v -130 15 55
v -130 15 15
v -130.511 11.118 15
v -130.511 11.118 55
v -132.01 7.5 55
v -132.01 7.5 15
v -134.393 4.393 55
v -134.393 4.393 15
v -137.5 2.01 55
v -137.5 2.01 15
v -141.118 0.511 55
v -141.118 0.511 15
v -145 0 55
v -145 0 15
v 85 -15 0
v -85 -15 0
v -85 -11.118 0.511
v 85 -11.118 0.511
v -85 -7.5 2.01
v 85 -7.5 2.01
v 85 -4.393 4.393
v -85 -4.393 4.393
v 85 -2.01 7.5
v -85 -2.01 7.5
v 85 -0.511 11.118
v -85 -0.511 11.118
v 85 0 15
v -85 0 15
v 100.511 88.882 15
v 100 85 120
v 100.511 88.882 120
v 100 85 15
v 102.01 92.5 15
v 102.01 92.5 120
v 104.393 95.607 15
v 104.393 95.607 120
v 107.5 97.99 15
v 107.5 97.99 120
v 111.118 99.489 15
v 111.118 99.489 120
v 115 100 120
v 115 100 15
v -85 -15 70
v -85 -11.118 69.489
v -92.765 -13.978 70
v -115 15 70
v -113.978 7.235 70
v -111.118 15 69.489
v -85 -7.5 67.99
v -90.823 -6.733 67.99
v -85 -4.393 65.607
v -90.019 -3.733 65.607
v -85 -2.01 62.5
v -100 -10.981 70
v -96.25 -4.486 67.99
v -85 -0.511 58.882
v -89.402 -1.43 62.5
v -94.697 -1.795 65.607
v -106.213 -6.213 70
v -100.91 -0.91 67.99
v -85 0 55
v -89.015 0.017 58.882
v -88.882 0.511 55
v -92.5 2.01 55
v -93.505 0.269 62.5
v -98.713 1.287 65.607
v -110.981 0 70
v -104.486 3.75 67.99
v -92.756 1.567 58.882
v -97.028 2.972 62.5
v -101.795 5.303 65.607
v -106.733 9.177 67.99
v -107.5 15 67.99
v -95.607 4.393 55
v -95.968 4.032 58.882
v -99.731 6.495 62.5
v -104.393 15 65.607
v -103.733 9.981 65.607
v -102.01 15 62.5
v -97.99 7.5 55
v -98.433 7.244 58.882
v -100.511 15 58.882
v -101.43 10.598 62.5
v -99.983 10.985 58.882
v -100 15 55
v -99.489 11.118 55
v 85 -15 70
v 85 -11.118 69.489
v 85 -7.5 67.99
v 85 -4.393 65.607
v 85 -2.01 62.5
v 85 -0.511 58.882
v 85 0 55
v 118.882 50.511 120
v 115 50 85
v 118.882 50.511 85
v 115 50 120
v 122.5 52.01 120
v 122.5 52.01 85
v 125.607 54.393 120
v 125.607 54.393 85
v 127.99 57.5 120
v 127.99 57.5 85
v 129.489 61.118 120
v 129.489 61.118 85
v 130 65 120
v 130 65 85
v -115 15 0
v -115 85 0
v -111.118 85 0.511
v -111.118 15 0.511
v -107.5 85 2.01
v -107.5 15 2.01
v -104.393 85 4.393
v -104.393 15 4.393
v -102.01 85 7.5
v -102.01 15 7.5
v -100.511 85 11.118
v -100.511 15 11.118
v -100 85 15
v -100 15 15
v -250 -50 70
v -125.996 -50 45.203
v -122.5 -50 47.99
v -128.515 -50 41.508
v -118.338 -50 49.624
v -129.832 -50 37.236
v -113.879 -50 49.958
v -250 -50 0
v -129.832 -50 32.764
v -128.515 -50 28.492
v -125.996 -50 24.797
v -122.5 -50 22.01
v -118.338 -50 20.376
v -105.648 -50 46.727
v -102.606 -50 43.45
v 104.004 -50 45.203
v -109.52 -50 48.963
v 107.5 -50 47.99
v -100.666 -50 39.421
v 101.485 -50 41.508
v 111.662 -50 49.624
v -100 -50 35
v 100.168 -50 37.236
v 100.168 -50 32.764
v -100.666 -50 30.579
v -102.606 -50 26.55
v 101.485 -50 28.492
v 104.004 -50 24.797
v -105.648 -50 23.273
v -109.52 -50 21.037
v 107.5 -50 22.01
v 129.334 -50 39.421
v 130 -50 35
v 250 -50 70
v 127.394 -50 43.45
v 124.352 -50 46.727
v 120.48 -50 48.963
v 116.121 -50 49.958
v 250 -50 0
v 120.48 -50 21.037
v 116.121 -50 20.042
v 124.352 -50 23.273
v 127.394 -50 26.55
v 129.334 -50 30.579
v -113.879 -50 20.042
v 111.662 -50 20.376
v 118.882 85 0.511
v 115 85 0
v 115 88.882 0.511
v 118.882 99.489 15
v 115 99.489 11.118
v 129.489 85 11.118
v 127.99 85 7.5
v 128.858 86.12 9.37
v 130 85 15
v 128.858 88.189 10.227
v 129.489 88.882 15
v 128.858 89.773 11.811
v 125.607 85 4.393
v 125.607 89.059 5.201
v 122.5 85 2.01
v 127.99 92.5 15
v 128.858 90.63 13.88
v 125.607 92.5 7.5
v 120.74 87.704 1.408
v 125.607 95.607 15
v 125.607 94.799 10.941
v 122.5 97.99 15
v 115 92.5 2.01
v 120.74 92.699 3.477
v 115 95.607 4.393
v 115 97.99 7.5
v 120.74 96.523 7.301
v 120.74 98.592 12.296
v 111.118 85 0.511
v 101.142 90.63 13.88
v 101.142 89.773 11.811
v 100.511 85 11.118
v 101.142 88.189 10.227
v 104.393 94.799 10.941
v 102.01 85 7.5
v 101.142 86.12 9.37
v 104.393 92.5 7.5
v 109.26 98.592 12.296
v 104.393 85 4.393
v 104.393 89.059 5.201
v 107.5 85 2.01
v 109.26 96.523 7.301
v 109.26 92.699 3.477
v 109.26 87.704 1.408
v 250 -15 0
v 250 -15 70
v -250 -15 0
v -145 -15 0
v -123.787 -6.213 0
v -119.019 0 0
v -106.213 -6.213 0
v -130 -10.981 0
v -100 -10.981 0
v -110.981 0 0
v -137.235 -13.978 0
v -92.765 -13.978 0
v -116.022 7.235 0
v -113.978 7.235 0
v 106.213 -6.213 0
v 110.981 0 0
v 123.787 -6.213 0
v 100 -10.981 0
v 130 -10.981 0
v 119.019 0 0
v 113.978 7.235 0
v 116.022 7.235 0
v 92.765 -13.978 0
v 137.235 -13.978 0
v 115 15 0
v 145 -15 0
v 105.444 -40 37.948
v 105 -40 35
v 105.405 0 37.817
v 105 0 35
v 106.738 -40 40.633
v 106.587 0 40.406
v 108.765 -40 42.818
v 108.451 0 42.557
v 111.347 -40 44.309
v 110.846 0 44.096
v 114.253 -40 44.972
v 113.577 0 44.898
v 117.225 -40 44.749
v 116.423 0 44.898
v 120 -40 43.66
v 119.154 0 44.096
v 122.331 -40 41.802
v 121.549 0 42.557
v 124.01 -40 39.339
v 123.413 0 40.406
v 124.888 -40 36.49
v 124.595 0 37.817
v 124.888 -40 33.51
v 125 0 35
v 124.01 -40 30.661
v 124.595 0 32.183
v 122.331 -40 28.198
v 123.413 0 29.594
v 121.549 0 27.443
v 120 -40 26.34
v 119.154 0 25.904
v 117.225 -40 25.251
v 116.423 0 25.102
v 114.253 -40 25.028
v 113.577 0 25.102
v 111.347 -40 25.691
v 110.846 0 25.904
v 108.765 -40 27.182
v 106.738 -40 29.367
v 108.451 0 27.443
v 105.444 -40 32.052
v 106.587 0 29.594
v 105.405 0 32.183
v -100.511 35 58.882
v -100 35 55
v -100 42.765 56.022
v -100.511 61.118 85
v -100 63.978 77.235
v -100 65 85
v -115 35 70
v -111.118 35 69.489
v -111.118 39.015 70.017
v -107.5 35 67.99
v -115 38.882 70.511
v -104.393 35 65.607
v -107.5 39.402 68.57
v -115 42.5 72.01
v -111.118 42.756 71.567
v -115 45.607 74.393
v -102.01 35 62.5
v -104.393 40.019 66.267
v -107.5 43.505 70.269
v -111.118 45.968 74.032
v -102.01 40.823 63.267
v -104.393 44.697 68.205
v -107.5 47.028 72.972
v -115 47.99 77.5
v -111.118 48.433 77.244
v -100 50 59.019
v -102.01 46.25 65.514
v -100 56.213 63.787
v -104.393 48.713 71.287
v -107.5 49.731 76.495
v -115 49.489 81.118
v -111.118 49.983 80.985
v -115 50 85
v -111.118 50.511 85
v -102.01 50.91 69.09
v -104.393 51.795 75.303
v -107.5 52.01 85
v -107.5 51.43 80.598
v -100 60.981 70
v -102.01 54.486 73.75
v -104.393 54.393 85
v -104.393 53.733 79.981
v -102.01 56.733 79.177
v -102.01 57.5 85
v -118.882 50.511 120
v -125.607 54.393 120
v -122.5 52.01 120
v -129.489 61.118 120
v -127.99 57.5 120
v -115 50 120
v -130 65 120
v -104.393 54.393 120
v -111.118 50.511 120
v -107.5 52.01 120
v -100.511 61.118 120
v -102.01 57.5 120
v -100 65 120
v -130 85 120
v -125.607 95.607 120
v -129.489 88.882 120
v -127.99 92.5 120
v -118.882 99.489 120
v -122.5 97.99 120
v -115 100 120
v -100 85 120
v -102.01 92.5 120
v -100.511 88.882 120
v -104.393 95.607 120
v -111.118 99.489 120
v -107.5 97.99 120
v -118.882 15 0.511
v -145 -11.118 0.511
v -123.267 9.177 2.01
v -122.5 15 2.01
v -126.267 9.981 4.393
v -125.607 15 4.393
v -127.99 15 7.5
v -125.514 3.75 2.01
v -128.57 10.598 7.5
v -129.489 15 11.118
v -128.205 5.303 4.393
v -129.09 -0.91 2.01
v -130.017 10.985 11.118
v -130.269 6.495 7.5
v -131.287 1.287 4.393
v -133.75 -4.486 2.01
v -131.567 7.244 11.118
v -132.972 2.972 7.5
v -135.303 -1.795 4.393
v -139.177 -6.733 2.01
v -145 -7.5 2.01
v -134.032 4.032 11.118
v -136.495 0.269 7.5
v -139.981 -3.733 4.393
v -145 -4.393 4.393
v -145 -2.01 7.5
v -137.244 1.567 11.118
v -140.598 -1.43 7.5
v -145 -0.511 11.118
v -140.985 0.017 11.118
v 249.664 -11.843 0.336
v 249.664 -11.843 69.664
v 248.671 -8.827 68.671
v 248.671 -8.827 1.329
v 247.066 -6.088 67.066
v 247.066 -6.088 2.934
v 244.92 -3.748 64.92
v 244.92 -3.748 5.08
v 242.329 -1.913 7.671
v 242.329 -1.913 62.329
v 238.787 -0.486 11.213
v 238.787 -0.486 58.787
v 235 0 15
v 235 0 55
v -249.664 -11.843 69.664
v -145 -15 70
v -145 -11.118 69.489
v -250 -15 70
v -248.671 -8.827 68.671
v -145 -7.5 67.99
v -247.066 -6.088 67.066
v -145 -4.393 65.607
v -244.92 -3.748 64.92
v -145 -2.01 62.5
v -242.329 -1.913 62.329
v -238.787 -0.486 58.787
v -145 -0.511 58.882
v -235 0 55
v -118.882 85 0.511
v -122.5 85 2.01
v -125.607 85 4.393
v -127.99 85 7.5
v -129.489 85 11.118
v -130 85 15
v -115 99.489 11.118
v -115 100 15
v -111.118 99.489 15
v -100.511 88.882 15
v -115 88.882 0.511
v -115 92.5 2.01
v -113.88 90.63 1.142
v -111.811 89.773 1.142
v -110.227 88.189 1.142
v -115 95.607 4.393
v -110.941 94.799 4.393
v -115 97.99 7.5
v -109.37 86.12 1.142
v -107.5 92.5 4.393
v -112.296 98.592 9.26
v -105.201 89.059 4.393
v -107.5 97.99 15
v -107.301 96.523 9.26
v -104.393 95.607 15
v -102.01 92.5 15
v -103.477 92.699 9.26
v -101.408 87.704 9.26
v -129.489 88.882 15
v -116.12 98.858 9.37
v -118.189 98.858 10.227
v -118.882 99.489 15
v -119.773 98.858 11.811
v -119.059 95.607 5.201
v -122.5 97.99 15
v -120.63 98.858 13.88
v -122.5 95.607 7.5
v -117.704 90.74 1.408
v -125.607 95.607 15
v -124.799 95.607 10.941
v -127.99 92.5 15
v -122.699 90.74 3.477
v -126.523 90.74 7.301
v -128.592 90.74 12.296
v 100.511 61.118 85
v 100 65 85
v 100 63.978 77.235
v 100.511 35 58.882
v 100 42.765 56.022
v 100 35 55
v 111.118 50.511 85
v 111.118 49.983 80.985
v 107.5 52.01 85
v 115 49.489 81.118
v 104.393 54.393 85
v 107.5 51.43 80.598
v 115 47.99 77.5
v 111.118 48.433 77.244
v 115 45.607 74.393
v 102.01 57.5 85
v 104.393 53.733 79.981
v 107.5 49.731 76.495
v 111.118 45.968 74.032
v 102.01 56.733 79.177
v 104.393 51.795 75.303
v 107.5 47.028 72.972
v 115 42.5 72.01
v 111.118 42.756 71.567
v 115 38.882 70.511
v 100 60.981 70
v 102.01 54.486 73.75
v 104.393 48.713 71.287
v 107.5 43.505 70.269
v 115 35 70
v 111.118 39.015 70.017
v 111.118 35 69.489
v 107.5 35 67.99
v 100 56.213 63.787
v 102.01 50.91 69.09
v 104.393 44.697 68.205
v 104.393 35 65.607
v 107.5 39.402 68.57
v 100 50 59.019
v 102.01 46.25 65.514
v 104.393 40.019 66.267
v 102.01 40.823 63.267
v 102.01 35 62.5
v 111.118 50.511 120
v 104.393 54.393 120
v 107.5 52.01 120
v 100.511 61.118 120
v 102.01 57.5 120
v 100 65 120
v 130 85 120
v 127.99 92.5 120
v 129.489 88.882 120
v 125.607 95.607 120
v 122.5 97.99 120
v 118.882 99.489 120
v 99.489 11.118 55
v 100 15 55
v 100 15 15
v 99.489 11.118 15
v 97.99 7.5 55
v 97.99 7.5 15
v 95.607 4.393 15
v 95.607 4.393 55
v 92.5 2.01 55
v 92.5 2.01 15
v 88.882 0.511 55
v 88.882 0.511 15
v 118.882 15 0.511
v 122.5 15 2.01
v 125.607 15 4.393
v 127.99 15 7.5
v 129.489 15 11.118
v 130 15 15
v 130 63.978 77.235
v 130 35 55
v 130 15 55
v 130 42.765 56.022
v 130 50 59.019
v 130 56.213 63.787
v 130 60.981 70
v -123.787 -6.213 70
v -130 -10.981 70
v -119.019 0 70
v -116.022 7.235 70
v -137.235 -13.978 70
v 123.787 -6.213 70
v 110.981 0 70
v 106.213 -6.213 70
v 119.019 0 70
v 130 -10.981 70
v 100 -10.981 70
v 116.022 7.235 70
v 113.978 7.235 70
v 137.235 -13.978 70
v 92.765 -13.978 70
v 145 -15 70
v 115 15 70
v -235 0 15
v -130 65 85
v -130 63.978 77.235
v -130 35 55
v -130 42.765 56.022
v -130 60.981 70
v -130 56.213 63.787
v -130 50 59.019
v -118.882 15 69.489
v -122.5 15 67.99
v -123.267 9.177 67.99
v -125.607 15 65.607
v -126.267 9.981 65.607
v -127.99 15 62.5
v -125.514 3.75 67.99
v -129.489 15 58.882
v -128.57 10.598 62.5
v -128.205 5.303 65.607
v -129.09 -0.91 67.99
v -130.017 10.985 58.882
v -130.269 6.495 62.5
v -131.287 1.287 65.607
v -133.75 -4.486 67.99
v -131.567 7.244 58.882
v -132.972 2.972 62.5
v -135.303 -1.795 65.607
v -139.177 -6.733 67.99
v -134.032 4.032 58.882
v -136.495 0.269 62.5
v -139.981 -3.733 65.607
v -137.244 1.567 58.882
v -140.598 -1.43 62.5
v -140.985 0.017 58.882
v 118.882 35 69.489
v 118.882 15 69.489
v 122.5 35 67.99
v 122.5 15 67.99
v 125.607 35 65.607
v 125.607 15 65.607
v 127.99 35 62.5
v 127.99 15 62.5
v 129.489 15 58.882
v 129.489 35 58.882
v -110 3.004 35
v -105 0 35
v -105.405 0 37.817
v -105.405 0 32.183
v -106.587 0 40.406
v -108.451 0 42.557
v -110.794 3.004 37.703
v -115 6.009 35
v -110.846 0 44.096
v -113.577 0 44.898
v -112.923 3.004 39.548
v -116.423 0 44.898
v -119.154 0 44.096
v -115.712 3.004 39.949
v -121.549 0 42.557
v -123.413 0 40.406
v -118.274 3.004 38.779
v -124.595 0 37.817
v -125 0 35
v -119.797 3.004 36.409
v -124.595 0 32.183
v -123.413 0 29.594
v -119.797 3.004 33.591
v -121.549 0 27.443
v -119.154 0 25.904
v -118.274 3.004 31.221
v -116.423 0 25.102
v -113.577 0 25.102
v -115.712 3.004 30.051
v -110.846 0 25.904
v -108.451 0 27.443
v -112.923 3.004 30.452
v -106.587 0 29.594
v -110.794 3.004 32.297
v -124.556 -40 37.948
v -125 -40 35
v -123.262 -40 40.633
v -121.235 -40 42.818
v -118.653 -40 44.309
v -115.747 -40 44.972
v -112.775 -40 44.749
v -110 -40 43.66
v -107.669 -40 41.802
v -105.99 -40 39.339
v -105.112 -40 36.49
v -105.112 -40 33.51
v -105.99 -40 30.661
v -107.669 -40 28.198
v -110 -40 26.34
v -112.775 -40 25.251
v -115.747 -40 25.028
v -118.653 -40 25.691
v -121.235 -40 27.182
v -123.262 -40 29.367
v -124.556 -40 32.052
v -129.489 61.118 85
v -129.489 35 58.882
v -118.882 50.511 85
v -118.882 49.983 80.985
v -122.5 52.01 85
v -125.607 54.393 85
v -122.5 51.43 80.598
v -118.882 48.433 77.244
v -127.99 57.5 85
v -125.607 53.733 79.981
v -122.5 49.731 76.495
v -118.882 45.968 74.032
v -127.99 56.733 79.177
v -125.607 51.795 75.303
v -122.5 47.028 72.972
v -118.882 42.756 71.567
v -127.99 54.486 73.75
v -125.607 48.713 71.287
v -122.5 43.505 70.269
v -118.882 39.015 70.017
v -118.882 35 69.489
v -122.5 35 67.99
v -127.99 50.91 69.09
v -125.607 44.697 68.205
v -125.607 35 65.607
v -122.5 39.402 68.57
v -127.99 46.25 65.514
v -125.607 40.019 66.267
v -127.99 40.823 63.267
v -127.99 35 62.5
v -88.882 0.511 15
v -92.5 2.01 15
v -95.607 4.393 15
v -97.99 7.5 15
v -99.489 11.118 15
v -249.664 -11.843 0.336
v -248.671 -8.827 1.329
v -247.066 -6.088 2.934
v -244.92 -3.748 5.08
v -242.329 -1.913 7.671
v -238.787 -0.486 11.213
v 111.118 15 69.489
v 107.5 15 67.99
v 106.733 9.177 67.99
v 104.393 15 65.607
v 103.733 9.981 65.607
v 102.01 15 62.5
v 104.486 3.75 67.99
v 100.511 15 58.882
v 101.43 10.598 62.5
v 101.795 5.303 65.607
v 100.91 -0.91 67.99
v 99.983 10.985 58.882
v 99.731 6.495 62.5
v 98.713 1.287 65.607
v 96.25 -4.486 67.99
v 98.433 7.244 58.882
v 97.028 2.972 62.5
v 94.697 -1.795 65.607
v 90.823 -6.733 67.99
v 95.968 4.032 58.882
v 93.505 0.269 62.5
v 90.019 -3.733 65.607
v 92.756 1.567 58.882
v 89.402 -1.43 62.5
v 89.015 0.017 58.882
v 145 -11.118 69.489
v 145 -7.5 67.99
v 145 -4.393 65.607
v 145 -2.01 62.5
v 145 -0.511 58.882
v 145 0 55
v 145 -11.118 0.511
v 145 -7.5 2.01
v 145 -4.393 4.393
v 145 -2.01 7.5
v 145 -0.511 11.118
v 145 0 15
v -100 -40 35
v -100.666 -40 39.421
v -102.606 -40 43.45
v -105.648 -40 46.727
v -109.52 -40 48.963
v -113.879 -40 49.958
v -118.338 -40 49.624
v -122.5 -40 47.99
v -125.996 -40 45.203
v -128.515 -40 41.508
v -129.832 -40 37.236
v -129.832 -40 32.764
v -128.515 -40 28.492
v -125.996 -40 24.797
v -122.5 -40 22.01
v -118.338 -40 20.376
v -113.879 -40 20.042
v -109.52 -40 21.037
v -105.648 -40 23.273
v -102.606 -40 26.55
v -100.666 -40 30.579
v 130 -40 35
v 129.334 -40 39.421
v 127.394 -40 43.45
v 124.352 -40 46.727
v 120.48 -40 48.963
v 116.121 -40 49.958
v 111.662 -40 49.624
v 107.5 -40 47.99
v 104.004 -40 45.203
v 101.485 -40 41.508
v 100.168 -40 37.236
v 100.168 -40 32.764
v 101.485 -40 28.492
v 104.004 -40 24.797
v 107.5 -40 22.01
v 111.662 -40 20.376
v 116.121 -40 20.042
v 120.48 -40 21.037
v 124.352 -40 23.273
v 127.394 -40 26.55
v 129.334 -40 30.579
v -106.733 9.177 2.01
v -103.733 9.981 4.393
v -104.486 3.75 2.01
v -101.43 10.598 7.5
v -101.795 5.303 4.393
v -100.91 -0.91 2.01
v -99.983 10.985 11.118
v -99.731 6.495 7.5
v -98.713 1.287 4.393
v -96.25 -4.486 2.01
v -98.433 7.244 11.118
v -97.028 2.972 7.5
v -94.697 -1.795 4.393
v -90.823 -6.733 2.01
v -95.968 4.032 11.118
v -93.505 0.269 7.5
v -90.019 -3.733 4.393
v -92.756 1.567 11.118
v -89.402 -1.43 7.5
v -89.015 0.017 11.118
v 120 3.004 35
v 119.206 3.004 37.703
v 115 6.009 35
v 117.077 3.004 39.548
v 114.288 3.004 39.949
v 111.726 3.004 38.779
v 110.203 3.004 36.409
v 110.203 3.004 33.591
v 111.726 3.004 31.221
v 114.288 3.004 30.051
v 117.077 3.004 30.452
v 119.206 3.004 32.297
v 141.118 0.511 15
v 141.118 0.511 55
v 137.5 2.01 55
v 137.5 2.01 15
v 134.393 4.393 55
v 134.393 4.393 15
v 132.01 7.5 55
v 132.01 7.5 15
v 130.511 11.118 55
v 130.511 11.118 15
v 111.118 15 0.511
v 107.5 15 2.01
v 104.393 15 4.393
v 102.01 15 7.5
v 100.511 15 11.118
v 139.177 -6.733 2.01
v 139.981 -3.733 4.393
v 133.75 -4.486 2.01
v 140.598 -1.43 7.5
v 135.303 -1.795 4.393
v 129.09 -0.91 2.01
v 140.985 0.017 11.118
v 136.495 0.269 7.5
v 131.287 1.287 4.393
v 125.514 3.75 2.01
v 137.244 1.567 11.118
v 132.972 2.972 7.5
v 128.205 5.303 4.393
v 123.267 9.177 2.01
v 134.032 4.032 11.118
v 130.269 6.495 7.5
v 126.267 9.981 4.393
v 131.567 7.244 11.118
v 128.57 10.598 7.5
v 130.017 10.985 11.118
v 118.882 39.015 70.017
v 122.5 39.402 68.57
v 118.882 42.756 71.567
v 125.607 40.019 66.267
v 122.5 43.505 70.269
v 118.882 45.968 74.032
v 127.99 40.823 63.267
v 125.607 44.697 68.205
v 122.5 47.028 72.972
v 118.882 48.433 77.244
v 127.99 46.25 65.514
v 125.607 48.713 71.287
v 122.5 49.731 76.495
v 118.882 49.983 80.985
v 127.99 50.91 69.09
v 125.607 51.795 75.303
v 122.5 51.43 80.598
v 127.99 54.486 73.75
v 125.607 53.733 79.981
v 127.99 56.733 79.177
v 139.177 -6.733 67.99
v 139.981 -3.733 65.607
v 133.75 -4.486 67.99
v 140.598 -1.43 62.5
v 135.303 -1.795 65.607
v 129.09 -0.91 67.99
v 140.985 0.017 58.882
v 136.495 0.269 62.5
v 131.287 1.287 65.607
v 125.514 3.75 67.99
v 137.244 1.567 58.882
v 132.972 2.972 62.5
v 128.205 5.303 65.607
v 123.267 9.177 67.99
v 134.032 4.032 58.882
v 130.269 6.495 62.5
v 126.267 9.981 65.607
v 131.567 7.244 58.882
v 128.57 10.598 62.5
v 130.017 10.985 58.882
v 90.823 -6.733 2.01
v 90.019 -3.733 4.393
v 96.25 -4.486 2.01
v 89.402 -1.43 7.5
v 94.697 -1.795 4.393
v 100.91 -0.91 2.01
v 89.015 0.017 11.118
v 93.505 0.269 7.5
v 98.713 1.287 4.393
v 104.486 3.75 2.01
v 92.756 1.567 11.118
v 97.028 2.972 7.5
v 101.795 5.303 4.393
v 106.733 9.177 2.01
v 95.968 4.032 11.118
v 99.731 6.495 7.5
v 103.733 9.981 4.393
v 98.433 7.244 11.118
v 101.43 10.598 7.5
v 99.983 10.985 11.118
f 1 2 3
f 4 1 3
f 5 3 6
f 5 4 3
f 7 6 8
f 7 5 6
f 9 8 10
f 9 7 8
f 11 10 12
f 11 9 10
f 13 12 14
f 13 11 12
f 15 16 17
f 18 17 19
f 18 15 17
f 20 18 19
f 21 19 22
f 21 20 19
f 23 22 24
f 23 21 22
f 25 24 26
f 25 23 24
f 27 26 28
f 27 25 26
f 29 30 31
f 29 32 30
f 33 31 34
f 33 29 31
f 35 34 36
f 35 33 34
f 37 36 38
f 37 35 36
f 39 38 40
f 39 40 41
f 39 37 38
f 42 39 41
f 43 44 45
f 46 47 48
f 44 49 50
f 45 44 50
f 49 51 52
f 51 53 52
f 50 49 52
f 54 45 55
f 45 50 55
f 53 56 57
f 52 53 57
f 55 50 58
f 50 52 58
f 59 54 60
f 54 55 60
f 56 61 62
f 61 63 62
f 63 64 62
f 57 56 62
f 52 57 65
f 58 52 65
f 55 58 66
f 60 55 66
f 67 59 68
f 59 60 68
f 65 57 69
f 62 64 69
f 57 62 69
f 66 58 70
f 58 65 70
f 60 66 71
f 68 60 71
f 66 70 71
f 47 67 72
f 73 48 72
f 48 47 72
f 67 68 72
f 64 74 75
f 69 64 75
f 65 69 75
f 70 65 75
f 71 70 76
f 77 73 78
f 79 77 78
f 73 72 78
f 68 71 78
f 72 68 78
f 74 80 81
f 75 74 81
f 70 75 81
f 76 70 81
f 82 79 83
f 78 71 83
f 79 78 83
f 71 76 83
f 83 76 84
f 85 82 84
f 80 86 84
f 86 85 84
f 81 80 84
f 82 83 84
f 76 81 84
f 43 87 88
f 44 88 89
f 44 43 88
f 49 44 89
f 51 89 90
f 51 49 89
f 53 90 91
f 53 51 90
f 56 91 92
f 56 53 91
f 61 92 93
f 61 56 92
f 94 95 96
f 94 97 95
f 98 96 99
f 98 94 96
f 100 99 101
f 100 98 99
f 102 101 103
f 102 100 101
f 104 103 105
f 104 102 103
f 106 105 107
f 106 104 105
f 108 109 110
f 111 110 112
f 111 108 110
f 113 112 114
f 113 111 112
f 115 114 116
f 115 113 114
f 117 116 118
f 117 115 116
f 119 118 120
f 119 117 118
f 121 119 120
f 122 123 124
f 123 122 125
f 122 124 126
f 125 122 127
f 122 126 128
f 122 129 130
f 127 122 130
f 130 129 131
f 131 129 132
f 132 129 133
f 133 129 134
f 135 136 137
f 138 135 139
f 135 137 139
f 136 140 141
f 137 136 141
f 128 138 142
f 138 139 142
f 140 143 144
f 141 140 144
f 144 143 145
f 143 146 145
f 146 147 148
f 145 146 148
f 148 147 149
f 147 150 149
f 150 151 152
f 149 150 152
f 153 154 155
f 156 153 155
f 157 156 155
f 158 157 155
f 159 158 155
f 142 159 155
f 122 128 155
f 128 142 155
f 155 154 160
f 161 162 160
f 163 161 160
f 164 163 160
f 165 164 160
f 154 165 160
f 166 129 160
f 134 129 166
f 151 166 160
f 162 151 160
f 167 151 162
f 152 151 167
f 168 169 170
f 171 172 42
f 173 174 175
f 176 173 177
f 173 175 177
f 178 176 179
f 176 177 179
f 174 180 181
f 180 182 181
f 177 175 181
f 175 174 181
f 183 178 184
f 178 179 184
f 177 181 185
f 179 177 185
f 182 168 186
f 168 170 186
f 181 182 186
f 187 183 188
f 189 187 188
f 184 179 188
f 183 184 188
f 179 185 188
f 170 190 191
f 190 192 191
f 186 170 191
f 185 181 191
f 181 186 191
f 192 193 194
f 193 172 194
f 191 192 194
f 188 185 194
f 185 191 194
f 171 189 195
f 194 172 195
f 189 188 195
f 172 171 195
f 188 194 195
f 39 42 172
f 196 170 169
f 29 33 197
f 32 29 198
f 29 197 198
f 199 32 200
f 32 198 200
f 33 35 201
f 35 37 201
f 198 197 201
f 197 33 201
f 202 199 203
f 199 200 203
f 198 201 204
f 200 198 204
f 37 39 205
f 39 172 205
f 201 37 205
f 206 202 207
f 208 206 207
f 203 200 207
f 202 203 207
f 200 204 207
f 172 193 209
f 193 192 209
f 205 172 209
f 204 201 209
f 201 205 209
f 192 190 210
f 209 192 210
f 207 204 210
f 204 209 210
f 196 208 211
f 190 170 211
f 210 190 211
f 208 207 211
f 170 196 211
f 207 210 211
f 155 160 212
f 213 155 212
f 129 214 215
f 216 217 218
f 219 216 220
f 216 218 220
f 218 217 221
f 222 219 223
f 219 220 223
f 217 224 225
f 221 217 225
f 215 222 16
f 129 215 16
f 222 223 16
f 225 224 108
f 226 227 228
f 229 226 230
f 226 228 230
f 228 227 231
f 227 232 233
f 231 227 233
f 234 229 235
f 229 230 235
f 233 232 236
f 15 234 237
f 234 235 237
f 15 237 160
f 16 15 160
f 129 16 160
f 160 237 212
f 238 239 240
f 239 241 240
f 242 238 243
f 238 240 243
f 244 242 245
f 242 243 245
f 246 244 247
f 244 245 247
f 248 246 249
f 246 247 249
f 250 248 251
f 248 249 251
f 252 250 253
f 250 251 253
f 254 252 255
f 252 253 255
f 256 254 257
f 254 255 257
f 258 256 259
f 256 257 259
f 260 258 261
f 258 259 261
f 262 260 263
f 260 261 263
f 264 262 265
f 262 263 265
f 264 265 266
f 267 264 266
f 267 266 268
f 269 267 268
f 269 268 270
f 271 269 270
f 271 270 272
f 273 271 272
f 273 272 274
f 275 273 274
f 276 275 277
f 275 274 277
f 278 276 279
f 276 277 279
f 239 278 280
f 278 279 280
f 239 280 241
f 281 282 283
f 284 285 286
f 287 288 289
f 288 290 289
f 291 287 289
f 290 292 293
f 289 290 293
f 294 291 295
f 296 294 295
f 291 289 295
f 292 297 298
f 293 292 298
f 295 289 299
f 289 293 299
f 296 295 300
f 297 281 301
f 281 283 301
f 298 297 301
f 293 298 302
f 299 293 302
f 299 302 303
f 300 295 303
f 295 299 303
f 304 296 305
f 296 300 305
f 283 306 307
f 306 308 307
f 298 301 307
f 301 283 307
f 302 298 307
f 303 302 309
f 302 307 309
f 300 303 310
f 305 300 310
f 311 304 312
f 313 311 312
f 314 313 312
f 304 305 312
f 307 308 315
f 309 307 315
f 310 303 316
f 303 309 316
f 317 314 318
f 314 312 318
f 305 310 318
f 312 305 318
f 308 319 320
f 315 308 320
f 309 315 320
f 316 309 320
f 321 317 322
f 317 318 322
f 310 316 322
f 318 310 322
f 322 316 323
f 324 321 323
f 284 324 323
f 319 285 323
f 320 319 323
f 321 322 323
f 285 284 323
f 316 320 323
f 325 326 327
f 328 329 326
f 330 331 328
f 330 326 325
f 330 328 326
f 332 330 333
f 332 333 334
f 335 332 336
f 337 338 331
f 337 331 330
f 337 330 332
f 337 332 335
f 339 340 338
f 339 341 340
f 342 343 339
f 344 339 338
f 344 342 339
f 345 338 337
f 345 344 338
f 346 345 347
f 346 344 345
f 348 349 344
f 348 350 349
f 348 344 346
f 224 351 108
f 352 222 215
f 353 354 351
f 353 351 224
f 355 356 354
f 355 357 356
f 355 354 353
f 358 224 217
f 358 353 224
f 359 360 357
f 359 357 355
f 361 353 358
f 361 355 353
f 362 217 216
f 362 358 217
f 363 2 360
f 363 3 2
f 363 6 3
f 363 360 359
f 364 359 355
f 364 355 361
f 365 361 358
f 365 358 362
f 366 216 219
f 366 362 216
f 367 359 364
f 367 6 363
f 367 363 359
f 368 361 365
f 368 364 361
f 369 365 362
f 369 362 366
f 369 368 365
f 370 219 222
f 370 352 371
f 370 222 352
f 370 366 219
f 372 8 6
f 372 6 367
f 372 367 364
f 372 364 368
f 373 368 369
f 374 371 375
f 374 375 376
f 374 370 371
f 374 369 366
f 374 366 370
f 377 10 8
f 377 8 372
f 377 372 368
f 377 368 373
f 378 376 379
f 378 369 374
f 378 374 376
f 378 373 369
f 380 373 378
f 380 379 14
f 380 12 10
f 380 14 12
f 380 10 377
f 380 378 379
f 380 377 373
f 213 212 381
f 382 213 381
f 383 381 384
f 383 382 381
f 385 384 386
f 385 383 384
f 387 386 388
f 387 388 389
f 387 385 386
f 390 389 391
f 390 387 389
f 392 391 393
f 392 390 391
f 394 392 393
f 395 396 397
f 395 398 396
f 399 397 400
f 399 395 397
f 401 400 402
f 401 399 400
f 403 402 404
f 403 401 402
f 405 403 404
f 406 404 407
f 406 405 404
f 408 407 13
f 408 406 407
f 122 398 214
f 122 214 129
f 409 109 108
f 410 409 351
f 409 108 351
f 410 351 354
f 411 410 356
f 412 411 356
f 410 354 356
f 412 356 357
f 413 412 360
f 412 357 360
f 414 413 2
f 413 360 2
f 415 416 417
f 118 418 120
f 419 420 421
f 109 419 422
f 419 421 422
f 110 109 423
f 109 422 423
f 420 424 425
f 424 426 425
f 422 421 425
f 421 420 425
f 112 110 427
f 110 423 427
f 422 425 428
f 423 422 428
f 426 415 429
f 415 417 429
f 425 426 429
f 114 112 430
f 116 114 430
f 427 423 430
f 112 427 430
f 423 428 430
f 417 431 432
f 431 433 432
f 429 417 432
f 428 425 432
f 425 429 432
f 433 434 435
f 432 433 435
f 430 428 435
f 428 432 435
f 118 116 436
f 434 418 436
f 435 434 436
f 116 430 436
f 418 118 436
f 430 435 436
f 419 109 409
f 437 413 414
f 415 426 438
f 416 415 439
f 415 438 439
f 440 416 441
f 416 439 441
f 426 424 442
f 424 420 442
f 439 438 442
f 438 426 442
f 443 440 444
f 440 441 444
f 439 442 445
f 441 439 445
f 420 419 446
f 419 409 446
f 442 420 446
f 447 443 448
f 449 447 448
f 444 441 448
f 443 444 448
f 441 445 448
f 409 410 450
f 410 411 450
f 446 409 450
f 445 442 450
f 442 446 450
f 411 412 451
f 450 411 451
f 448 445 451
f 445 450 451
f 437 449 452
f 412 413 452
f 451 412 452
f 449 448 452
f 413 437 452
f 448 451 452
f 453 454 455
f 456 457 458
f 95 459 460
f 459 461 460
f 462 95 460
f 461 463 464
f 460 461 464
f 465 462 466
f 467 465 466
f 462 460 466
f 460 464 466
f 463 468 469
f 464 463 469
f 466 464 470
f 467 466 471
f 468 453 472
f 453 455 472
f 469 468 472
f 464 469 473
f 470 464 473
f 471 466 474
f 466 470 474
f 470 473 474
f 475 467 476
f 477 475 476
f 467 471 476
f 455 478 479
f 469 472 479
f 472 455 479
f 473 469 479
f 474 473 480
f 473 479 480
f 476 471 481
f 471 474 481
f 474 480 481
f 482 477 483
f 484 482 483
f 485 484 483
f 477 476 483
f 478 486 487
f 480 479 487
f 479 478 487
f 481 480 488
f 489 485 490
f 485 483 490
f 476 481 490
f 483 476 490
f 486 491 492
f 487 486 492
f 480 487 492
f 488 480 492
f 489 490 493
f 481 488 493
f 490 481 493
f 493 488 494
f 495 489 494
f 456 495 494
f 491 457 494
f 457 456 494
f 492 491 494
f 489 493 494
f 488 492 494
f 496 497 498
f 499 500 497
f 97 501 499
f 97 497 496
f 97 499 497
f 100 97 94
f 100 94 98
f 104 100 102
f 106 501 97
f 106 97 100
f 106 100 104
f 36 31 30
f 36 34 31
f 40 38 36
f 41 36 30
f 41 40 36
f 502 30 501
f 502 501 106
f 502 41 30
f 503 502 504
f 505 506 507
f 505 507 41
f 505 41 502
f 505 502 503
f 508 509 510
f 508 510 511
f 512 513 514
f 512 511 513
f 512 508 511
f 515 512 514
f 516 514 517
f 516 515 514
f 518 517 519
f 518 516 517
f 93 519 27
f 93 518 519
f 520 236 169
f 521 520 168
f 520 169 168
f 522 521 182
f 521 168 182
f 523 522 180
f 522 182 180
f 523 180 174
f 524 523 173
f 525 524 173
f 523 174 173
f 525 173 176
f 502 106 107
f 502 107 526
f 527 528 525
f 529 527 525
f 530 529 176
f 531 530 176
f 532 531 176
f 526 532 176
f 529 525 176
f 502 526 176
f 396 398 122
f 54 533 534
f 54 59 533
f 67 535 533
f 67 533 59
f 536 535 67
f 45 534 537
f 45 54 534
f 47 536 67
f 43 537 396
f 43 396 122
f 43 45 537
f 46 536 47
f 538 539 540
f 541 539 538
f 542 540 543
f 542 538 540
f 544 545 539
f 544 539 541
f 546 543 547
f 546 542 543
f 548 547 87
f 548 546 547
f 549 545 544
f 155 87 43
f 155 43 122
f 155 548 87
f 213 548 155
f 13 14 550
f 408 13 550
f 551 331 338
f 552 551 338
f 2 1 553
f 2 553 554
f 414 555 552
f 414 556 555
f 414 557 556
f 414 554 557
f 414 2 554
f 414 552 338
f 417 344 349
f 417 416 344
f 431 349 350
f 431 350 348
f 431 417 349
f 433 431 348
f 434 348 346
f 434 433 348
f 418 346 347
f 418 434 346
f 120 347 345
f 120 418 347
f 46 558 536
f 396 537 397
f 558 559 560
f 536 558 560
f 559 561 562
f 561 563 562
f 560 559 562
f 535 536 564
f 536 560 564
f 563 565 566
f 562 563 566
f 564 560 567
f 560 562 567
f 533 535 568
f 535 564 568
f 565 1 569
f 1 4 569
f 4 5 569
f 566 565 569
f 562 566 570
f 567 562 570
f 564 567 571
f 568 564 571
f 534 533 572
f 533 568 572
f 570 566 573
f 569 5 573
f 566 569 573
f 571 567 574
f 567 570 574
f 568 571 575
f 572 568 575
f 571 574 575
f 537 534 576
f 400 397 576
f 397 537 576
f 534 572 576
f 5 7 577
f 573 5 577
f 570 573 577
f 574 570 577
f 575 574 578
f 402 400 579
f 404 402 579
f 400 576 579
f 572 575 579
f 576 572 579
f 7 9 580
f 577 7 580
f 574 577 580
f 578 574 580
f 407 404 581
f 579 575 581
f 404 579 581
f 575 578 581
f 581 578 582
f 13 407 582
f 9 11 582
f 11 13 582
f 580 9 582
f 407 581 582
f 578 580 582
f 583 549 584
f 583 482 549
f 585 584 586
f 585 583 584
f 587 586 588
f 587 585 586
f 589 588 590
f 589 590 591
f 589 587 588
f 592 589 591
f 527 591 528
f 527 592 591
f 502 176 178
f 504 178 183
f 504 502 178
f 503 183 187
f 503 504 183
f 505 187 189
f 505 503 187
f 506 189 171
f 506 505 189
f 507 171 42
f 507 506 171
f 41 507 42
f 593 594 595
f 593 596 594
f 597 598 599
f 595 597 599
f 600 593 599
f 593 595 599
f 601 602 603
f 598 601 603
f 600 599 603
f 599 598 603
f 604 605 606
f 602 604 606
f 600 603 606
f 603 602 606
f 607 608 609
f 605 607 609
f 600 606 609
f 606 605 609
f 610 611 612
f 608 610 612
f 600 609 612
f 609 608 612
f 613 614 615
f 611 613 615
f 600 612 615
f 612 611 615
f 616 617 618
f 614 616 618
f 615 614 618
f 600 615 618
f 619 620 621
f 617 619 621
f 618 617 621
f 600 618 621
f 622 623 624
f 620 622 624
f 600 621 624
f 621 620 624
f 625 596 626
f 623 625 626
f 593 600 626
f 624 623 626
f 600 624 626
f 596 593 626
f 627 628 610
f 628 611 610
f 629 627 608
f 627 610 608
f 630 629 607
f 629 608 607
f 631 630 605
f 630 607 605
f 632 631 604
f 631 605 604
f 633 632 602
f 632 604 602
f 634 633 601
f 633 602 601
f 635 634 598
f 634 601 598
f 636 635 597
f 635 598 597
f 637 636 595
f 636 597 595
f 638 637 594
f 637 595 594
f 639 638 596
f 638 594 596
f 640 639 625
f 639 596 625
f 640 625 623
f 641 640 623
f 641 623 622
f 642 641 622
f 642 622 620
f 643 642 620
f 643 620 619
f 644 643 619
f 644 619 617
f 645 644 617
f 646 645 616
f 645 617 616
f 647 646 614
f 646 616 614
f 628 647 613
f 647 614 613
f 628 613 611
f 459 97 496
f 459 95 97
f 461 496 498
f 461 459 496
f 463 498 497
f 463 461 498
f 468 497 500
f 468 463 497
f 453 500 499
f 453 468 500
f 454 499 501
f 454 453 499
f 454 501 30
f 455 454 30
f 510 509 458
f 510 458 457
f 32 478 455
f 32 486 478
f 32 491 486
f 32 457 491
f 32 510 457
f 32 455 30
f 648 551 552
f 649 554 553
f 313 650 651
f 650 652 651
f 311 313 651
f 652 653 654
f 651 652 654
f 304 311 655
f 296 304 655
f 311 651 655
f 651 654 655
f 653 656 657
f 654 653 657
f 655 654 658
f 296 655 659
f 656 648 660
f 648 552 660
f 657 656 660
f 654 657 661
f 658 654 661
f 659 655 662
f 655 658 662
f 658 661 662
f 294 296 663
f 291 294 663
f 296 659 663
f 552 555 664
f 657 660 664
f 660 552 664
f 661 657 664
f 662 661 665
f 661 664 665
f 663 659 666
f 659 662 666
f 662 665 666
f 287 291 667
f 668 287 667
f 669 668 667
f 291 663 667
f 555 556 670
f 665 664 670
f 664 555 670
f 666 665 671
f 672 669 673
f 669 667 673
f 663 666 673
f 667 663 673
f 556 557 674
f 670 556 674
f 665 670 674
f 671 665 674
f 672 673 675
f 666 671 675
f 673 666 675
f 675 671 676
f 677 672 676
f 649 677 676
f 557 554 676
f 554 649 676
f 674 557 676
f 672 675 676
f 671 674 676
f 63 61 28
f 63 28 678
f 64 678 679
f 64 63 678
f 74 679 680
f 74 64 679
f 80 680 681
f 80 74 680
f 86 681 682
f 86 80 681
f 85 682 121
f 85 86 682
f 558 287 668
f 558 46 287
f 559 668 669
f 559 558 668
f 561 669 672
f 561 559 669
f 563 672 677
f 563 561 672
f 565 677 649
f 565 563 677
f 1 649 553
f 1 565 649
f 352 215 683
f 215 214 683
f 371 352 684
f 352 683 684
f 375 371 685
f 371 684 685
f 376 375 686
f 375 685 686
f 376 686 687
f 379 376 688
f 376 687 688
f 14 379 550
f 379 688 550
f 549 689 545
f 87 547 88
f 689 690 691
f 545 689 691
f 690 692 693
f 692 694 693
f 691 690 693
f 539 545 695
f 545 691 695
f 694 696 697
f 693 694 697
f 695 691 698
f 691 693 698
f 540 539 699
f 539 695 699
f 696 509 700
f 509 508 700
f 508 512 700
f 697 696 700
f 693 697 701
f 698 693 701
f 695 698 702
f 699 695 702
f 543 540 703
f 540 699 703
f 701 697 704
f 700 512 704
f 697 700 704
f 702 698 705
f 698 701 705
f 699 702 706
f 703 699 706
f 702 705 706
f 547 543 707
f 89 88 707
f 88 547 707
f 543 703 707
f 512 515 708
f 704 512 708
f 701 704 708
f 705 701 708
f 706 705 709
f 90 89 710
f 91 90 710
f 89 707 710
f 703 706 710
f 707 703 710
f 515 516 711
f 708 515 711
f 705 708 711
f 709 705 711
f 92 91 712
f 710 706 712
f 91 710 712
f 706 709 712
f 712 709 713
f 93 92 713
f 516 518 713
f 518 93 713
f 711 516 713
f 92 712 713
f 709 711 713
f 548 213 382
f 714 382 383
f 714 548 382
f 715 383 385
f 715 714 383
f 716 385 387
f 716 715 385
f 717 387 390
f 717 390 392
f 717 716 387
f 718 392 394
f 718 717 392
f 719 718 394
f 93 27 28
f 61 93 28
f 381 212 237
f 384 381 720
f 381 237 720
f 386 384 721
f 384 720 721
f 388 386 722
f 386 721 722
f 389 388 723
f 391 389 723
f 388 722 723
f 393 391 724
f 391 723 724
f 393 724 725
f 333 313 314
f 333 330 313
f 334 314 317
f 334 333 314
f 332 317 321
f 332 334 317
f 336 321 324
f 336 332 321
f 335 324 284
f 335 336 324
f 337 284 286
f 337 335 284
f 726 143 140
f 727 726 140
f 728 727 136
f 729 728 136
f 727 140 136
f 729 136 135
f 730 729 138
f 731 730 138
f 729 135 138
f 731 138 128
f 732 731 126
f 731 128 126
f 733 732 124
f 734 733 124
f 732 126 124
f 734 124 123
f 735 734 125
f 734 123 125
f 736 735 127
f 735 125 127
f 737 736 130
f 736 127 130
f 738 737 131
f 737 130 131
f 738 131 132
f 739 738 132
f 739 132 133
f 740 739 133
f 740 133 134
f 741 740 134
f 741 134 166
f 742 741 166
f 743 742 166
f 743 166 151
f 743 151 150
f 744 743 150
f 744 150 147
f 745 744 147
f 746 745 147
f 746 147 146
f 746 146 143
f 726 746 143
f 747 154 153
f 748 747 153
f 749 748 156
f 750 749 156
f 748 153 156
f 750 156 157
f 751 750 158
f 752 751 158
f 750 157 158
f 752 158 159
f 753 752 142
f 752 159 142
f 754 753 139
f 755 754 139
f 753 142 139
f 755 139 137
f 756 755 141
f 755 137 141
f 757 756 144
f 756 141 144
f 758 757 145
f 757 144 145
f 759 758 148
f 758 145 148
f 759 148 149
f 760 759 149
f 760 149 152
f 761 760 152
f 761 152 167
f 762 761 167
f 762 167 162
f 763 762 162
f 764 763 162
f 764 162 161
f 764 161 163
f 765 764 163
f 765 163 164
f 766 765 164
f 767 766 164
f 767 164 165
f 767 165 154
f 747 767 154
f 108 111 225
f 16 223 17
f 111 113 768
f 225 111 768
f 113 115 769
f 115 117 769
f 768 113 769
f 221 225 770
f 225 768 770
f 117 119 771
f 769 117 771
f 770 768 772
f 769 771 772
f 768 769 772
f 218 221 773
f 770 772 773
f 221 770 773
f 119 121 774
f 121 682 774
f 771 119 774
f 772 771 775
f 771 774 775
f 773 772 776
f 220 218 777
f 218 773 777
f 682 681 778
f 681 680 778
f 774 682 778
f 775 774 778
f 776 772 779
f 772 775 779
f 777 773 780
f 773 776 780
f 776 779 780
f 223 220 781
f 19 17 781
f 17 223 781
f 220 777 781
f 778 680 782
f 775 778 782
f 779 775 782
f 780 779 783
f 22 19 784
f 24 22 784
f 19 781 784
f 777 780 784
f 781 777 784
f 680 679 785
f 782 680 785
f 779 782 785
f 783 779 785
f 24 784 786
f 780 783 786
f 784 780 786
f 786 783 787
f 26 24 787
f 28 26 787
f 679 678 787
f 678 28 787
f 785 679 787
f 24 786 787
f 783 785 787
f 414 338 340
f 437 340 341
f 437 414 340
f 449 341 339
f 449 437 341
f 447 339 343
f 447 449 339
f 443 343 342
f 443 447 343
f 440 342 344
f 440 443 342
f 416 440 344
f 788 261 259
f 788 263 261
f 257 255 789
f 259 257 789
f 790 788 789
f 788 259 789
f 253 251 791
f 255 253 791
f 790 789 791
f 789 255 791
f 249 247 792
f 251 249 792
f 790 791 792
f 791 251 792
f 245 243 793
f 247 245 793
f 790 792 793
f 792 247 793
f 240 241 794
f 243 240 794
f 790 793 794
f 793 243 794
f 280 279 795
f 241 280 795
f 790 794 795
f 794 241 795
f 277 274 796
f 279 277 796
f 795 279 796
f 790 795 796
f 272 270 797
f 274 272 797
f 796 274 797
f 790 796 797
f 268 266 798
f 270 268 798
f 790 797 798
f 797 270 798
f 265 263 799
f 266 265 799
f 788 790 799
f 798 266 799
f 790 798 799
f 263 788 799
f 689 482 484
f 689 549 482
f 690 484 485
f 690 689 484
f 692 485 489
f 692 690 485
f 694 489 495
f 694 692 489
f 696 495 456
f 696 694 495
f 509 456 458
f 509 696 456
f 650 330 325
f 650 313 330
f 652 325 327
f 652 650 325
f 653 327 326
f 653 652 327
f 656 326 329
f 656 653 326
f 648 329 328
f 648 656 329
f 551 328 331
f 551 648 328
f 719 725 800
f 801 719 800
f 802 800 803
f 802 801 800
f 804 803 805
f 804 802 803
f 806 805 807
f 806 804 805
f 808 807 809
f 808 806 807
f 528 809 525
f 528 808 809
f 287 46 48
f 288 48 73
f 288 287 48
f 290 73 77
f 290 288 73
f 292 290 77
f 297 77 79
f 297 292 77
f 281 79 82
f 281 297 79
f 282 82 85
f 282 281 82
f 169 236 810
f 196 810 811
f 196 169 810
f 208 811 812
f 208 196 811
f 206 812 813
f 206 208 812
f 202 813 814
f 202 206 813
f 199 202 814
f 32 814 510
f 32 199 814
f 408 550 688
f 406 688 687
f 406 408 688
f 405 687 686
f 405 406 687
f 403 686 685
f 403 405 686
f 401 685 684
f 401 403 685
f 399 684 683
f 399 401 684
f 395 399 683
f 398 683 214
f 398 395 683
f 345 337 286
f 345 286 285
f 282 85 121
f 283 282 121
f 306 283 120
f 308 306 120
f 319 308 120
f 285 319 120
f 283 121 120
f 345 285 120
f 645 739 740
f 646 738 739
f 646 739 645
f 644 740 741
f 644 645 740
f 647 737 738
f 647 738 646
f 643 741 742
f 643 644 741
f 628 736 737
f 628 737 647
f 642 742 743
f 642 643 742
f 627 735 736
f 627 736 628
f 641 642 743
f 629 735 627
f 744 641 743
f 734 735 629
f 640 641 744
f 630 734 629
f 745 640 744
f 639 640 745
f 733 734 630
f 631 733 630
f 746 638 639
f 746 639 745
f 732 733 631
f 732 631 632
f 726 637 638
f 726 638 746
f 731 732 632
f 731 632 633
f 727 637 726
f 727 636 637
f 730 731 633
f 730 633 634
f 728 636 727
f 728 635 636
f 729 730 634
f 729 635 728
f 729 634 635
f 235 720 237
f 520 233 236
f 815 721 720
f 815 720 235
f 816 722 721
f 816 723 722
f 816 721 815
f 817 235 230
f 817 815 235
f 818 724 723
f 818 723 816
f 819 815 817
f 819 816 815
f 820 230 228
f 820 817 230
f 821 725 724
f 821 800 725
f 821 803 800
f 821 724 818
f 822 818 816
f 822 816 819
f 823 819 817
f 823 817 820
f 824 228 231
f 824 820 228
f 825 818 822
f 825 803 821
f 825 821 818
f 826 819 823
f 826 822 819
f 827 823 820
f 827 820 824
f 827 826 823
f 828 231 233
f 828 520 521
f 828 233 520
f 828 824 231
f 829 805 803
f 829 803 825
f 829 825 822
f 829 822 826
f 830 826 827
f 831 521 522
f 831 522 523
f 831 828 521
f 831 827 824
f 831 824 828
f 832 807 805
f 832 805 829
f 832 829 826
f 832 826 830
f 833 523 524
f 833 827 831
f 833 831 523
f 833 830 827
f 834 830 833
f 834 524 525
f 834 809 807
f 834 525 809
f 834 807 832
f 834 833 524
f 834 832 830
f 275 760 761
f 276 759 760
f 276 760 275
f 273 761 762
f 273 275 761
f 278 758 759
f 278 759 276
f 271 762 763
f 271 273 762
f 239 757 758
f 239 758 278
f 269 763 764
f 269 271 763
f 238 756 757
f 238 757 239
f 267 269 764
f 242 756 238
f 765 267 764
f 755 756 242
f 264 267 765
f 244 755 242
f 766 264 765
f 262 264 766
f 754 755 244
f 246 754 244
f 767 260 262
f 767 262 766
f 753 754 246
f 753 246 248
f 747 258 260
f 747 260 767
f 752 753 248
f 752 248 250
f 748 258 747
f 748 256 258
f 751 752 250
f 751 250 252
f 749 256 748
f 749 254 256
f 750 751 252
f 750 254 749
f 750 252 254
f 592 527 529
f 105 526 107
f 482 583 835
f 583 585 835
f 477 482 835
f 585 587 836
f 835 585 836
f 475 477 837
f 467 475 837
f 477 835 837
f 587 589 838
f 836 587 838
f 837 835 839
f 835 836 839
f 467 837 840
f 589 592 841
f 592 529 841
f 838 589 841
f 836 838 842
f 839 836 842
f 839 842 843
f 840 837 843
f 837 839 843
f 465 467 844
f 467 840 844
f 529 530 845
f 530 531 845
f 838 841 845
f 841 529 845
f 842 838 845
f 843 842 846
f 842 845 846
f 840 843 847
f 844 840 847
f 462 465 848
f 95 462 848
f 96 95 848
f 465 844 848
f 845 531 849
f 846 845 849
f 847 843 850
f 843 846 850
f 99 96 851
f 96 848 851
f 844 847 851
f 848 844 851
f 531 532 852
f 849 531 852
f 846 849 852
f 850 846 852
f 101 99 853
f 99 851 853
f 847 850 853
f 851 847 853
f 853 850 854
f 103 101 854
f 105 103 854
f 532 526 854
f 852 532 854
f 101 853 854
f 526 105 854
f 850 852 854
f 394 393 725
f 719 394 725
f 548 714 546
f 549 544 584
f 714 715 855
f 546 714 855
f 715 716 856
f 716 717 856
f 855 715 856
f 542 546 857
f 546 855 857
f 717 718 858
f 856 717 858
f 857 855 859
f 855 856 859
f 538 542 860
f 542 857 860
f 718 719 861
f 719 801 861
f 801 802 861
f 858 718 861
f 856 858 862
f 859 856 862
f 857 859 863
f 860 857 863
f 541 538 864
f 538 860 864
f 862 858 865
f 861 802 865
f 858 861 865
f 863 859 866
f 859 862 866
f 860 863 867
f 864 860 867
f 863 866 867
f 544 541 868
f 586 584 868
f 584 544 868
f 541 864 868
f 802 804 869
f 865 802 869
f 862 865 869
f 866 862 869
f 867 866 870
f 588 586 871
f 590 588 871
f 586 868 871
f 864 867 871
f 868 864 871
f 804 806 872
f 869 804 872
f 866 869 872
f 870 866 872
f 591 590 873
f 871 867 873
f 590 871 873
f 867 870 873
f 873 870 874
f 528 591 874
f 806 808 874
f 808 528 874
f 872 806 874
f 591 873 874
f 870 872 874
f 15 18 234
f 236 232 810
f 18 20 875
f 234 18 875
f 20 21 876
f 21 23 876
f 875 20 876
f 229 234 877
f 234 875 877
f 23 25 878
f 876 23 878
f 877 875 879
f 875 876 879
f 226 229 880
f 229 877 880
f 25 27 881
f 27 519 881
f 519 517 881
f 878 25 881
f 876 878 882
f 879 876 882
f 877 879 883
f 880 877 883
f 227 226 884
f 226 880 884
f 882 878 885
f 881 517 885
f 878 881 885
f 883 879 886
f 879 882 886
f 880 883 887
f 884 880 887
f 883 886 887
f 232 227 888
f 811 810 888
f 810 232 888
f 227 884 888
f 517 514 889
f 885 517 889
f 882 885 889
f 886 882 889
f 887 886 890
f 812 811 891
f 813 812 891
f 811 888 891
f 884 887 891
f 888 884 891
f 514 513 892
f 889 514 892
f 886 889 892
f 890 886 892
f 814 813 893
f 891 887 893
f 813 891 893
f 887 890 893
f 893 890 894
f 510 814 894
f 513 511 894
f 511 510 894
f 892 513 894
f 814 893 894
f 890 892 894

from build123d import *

# Parameters (mm, degrees)
F0_W           = 30
F0_H           = 100
F1_DEPTH       = 70
F2_W           = 30
F2_H           = 50
F3_DEPTH       = 50
F4_F1_R        = 15
F4_F2_R        = 14.9999
F6_D           = 20
F6_DEPTH       = 50
F6_CBORE_D     = 30
F6_CBORE_DEPTH = 10
F6_TIP         = 6.0086061903


# Not quite as in the source:
# - a fillet or chamfer is up to 0.001 mm smaller than in the source, because OpenCascade refuses the exact size


with BuildPart() as f1:
    # F0 (on Top) → F1 (new body)
    with BuildSketch(Plane.XY):
        Polygon((-130, 0), (-250, 0), (-250, -50), (250, -50), (250, 0), (130, 0), (100, 0), (-100, 0), align=None)
        with Locations((-115, 50)):
            Rectangle(F0_W, F0_H)
        with Locations((115, 50)):
            Rectangle(F0_W, F0_H)
    extrude(amount=F1_DEPTH)

    # F2 (on face) → F3 (join)
    with BuildSketch(Plane.XY.offset(70)):
        with Locations((-115, 75)):
            Rectangle(F2_W, F2_H)
        with Locations((115, 75)):
            Rectangle(F2_W, F2_H)
    extrude(amount=F3_DEPTH)

    # F4: fillet of radius 15 on 24 edges, made by hand

    # F4_f1
    f4_f1_edges = [f1.edges().sort_by_distance(p)[0] for p in [
        (-115, 50, 70),
        (115, 50, 70),
        (100, 0, 35),
        (-130, 0, 35),
        (-100, 0, 35),
        (130, 0, 35),
    ]]
    fillet(f4_f1_edges, radius=F4_F1_R)

    # F4_f2 (radius 15 in the source; OpenCascade refuses exactly that, so slightly less here)
    f4_f2_edges = [f1.edges().sort_by_distance(p)[0] for p in [
        (-197.5, 0, 70),
        (115, 100, 0),
        (197.5, 0, 0),
        (197.5, 0, 70),
        (250, 0, 35),
        (130, 100, 60),
        (100, 100, 60),
        (-197.5, 0, 0),
        (-250, 0, 35),
        (-100, 100, 60),
        (-115, 100, 0),
        (-130, 100, 60),
        (0, 0, 70),
        (130, 57.5, 0),
        (100, 57.5, 0),
        (0, 0, 0),
        (-100, 57.5, 0),
        (-130, 57.5, 0),
        (-134.3933982822, 4.3933982822, 0),
        (-95.6066017178, 4.3933982822, 0),
        (95.6066017178, 4.3933982822, 0),
        (134.3933982822, 4.3933982822, 0),
        (95.6066017178, 4.3933982822, 70),
        (-95.6066017178, 4.3933982822, 70),
        (134.3933982822, 4.3933982822, 70),
        (-134.3933982822, 4.3933982822, 70),
    ]]
    fillet(f4_f2_edges, radius=F4_F2_R)

    # F6
    with Locations(Plane.XZ.offset(50)):
        with Locations((-114.9999999844, 35), (115.0000000156, 35)):
            CounterBoreHole(F6_D / 2, F6_CBORE_D / 2, F6_CBORE_DEPTH, depth=F6_DEPTH)
            with Locations((0, 0, -(F6_DEPTH + F6_TIP / 2))):  # 118° drill point
                Cone(0, F6_D / 2, F6_TIP, mode=Mode.SUBTRACT)


solid = f1.part
